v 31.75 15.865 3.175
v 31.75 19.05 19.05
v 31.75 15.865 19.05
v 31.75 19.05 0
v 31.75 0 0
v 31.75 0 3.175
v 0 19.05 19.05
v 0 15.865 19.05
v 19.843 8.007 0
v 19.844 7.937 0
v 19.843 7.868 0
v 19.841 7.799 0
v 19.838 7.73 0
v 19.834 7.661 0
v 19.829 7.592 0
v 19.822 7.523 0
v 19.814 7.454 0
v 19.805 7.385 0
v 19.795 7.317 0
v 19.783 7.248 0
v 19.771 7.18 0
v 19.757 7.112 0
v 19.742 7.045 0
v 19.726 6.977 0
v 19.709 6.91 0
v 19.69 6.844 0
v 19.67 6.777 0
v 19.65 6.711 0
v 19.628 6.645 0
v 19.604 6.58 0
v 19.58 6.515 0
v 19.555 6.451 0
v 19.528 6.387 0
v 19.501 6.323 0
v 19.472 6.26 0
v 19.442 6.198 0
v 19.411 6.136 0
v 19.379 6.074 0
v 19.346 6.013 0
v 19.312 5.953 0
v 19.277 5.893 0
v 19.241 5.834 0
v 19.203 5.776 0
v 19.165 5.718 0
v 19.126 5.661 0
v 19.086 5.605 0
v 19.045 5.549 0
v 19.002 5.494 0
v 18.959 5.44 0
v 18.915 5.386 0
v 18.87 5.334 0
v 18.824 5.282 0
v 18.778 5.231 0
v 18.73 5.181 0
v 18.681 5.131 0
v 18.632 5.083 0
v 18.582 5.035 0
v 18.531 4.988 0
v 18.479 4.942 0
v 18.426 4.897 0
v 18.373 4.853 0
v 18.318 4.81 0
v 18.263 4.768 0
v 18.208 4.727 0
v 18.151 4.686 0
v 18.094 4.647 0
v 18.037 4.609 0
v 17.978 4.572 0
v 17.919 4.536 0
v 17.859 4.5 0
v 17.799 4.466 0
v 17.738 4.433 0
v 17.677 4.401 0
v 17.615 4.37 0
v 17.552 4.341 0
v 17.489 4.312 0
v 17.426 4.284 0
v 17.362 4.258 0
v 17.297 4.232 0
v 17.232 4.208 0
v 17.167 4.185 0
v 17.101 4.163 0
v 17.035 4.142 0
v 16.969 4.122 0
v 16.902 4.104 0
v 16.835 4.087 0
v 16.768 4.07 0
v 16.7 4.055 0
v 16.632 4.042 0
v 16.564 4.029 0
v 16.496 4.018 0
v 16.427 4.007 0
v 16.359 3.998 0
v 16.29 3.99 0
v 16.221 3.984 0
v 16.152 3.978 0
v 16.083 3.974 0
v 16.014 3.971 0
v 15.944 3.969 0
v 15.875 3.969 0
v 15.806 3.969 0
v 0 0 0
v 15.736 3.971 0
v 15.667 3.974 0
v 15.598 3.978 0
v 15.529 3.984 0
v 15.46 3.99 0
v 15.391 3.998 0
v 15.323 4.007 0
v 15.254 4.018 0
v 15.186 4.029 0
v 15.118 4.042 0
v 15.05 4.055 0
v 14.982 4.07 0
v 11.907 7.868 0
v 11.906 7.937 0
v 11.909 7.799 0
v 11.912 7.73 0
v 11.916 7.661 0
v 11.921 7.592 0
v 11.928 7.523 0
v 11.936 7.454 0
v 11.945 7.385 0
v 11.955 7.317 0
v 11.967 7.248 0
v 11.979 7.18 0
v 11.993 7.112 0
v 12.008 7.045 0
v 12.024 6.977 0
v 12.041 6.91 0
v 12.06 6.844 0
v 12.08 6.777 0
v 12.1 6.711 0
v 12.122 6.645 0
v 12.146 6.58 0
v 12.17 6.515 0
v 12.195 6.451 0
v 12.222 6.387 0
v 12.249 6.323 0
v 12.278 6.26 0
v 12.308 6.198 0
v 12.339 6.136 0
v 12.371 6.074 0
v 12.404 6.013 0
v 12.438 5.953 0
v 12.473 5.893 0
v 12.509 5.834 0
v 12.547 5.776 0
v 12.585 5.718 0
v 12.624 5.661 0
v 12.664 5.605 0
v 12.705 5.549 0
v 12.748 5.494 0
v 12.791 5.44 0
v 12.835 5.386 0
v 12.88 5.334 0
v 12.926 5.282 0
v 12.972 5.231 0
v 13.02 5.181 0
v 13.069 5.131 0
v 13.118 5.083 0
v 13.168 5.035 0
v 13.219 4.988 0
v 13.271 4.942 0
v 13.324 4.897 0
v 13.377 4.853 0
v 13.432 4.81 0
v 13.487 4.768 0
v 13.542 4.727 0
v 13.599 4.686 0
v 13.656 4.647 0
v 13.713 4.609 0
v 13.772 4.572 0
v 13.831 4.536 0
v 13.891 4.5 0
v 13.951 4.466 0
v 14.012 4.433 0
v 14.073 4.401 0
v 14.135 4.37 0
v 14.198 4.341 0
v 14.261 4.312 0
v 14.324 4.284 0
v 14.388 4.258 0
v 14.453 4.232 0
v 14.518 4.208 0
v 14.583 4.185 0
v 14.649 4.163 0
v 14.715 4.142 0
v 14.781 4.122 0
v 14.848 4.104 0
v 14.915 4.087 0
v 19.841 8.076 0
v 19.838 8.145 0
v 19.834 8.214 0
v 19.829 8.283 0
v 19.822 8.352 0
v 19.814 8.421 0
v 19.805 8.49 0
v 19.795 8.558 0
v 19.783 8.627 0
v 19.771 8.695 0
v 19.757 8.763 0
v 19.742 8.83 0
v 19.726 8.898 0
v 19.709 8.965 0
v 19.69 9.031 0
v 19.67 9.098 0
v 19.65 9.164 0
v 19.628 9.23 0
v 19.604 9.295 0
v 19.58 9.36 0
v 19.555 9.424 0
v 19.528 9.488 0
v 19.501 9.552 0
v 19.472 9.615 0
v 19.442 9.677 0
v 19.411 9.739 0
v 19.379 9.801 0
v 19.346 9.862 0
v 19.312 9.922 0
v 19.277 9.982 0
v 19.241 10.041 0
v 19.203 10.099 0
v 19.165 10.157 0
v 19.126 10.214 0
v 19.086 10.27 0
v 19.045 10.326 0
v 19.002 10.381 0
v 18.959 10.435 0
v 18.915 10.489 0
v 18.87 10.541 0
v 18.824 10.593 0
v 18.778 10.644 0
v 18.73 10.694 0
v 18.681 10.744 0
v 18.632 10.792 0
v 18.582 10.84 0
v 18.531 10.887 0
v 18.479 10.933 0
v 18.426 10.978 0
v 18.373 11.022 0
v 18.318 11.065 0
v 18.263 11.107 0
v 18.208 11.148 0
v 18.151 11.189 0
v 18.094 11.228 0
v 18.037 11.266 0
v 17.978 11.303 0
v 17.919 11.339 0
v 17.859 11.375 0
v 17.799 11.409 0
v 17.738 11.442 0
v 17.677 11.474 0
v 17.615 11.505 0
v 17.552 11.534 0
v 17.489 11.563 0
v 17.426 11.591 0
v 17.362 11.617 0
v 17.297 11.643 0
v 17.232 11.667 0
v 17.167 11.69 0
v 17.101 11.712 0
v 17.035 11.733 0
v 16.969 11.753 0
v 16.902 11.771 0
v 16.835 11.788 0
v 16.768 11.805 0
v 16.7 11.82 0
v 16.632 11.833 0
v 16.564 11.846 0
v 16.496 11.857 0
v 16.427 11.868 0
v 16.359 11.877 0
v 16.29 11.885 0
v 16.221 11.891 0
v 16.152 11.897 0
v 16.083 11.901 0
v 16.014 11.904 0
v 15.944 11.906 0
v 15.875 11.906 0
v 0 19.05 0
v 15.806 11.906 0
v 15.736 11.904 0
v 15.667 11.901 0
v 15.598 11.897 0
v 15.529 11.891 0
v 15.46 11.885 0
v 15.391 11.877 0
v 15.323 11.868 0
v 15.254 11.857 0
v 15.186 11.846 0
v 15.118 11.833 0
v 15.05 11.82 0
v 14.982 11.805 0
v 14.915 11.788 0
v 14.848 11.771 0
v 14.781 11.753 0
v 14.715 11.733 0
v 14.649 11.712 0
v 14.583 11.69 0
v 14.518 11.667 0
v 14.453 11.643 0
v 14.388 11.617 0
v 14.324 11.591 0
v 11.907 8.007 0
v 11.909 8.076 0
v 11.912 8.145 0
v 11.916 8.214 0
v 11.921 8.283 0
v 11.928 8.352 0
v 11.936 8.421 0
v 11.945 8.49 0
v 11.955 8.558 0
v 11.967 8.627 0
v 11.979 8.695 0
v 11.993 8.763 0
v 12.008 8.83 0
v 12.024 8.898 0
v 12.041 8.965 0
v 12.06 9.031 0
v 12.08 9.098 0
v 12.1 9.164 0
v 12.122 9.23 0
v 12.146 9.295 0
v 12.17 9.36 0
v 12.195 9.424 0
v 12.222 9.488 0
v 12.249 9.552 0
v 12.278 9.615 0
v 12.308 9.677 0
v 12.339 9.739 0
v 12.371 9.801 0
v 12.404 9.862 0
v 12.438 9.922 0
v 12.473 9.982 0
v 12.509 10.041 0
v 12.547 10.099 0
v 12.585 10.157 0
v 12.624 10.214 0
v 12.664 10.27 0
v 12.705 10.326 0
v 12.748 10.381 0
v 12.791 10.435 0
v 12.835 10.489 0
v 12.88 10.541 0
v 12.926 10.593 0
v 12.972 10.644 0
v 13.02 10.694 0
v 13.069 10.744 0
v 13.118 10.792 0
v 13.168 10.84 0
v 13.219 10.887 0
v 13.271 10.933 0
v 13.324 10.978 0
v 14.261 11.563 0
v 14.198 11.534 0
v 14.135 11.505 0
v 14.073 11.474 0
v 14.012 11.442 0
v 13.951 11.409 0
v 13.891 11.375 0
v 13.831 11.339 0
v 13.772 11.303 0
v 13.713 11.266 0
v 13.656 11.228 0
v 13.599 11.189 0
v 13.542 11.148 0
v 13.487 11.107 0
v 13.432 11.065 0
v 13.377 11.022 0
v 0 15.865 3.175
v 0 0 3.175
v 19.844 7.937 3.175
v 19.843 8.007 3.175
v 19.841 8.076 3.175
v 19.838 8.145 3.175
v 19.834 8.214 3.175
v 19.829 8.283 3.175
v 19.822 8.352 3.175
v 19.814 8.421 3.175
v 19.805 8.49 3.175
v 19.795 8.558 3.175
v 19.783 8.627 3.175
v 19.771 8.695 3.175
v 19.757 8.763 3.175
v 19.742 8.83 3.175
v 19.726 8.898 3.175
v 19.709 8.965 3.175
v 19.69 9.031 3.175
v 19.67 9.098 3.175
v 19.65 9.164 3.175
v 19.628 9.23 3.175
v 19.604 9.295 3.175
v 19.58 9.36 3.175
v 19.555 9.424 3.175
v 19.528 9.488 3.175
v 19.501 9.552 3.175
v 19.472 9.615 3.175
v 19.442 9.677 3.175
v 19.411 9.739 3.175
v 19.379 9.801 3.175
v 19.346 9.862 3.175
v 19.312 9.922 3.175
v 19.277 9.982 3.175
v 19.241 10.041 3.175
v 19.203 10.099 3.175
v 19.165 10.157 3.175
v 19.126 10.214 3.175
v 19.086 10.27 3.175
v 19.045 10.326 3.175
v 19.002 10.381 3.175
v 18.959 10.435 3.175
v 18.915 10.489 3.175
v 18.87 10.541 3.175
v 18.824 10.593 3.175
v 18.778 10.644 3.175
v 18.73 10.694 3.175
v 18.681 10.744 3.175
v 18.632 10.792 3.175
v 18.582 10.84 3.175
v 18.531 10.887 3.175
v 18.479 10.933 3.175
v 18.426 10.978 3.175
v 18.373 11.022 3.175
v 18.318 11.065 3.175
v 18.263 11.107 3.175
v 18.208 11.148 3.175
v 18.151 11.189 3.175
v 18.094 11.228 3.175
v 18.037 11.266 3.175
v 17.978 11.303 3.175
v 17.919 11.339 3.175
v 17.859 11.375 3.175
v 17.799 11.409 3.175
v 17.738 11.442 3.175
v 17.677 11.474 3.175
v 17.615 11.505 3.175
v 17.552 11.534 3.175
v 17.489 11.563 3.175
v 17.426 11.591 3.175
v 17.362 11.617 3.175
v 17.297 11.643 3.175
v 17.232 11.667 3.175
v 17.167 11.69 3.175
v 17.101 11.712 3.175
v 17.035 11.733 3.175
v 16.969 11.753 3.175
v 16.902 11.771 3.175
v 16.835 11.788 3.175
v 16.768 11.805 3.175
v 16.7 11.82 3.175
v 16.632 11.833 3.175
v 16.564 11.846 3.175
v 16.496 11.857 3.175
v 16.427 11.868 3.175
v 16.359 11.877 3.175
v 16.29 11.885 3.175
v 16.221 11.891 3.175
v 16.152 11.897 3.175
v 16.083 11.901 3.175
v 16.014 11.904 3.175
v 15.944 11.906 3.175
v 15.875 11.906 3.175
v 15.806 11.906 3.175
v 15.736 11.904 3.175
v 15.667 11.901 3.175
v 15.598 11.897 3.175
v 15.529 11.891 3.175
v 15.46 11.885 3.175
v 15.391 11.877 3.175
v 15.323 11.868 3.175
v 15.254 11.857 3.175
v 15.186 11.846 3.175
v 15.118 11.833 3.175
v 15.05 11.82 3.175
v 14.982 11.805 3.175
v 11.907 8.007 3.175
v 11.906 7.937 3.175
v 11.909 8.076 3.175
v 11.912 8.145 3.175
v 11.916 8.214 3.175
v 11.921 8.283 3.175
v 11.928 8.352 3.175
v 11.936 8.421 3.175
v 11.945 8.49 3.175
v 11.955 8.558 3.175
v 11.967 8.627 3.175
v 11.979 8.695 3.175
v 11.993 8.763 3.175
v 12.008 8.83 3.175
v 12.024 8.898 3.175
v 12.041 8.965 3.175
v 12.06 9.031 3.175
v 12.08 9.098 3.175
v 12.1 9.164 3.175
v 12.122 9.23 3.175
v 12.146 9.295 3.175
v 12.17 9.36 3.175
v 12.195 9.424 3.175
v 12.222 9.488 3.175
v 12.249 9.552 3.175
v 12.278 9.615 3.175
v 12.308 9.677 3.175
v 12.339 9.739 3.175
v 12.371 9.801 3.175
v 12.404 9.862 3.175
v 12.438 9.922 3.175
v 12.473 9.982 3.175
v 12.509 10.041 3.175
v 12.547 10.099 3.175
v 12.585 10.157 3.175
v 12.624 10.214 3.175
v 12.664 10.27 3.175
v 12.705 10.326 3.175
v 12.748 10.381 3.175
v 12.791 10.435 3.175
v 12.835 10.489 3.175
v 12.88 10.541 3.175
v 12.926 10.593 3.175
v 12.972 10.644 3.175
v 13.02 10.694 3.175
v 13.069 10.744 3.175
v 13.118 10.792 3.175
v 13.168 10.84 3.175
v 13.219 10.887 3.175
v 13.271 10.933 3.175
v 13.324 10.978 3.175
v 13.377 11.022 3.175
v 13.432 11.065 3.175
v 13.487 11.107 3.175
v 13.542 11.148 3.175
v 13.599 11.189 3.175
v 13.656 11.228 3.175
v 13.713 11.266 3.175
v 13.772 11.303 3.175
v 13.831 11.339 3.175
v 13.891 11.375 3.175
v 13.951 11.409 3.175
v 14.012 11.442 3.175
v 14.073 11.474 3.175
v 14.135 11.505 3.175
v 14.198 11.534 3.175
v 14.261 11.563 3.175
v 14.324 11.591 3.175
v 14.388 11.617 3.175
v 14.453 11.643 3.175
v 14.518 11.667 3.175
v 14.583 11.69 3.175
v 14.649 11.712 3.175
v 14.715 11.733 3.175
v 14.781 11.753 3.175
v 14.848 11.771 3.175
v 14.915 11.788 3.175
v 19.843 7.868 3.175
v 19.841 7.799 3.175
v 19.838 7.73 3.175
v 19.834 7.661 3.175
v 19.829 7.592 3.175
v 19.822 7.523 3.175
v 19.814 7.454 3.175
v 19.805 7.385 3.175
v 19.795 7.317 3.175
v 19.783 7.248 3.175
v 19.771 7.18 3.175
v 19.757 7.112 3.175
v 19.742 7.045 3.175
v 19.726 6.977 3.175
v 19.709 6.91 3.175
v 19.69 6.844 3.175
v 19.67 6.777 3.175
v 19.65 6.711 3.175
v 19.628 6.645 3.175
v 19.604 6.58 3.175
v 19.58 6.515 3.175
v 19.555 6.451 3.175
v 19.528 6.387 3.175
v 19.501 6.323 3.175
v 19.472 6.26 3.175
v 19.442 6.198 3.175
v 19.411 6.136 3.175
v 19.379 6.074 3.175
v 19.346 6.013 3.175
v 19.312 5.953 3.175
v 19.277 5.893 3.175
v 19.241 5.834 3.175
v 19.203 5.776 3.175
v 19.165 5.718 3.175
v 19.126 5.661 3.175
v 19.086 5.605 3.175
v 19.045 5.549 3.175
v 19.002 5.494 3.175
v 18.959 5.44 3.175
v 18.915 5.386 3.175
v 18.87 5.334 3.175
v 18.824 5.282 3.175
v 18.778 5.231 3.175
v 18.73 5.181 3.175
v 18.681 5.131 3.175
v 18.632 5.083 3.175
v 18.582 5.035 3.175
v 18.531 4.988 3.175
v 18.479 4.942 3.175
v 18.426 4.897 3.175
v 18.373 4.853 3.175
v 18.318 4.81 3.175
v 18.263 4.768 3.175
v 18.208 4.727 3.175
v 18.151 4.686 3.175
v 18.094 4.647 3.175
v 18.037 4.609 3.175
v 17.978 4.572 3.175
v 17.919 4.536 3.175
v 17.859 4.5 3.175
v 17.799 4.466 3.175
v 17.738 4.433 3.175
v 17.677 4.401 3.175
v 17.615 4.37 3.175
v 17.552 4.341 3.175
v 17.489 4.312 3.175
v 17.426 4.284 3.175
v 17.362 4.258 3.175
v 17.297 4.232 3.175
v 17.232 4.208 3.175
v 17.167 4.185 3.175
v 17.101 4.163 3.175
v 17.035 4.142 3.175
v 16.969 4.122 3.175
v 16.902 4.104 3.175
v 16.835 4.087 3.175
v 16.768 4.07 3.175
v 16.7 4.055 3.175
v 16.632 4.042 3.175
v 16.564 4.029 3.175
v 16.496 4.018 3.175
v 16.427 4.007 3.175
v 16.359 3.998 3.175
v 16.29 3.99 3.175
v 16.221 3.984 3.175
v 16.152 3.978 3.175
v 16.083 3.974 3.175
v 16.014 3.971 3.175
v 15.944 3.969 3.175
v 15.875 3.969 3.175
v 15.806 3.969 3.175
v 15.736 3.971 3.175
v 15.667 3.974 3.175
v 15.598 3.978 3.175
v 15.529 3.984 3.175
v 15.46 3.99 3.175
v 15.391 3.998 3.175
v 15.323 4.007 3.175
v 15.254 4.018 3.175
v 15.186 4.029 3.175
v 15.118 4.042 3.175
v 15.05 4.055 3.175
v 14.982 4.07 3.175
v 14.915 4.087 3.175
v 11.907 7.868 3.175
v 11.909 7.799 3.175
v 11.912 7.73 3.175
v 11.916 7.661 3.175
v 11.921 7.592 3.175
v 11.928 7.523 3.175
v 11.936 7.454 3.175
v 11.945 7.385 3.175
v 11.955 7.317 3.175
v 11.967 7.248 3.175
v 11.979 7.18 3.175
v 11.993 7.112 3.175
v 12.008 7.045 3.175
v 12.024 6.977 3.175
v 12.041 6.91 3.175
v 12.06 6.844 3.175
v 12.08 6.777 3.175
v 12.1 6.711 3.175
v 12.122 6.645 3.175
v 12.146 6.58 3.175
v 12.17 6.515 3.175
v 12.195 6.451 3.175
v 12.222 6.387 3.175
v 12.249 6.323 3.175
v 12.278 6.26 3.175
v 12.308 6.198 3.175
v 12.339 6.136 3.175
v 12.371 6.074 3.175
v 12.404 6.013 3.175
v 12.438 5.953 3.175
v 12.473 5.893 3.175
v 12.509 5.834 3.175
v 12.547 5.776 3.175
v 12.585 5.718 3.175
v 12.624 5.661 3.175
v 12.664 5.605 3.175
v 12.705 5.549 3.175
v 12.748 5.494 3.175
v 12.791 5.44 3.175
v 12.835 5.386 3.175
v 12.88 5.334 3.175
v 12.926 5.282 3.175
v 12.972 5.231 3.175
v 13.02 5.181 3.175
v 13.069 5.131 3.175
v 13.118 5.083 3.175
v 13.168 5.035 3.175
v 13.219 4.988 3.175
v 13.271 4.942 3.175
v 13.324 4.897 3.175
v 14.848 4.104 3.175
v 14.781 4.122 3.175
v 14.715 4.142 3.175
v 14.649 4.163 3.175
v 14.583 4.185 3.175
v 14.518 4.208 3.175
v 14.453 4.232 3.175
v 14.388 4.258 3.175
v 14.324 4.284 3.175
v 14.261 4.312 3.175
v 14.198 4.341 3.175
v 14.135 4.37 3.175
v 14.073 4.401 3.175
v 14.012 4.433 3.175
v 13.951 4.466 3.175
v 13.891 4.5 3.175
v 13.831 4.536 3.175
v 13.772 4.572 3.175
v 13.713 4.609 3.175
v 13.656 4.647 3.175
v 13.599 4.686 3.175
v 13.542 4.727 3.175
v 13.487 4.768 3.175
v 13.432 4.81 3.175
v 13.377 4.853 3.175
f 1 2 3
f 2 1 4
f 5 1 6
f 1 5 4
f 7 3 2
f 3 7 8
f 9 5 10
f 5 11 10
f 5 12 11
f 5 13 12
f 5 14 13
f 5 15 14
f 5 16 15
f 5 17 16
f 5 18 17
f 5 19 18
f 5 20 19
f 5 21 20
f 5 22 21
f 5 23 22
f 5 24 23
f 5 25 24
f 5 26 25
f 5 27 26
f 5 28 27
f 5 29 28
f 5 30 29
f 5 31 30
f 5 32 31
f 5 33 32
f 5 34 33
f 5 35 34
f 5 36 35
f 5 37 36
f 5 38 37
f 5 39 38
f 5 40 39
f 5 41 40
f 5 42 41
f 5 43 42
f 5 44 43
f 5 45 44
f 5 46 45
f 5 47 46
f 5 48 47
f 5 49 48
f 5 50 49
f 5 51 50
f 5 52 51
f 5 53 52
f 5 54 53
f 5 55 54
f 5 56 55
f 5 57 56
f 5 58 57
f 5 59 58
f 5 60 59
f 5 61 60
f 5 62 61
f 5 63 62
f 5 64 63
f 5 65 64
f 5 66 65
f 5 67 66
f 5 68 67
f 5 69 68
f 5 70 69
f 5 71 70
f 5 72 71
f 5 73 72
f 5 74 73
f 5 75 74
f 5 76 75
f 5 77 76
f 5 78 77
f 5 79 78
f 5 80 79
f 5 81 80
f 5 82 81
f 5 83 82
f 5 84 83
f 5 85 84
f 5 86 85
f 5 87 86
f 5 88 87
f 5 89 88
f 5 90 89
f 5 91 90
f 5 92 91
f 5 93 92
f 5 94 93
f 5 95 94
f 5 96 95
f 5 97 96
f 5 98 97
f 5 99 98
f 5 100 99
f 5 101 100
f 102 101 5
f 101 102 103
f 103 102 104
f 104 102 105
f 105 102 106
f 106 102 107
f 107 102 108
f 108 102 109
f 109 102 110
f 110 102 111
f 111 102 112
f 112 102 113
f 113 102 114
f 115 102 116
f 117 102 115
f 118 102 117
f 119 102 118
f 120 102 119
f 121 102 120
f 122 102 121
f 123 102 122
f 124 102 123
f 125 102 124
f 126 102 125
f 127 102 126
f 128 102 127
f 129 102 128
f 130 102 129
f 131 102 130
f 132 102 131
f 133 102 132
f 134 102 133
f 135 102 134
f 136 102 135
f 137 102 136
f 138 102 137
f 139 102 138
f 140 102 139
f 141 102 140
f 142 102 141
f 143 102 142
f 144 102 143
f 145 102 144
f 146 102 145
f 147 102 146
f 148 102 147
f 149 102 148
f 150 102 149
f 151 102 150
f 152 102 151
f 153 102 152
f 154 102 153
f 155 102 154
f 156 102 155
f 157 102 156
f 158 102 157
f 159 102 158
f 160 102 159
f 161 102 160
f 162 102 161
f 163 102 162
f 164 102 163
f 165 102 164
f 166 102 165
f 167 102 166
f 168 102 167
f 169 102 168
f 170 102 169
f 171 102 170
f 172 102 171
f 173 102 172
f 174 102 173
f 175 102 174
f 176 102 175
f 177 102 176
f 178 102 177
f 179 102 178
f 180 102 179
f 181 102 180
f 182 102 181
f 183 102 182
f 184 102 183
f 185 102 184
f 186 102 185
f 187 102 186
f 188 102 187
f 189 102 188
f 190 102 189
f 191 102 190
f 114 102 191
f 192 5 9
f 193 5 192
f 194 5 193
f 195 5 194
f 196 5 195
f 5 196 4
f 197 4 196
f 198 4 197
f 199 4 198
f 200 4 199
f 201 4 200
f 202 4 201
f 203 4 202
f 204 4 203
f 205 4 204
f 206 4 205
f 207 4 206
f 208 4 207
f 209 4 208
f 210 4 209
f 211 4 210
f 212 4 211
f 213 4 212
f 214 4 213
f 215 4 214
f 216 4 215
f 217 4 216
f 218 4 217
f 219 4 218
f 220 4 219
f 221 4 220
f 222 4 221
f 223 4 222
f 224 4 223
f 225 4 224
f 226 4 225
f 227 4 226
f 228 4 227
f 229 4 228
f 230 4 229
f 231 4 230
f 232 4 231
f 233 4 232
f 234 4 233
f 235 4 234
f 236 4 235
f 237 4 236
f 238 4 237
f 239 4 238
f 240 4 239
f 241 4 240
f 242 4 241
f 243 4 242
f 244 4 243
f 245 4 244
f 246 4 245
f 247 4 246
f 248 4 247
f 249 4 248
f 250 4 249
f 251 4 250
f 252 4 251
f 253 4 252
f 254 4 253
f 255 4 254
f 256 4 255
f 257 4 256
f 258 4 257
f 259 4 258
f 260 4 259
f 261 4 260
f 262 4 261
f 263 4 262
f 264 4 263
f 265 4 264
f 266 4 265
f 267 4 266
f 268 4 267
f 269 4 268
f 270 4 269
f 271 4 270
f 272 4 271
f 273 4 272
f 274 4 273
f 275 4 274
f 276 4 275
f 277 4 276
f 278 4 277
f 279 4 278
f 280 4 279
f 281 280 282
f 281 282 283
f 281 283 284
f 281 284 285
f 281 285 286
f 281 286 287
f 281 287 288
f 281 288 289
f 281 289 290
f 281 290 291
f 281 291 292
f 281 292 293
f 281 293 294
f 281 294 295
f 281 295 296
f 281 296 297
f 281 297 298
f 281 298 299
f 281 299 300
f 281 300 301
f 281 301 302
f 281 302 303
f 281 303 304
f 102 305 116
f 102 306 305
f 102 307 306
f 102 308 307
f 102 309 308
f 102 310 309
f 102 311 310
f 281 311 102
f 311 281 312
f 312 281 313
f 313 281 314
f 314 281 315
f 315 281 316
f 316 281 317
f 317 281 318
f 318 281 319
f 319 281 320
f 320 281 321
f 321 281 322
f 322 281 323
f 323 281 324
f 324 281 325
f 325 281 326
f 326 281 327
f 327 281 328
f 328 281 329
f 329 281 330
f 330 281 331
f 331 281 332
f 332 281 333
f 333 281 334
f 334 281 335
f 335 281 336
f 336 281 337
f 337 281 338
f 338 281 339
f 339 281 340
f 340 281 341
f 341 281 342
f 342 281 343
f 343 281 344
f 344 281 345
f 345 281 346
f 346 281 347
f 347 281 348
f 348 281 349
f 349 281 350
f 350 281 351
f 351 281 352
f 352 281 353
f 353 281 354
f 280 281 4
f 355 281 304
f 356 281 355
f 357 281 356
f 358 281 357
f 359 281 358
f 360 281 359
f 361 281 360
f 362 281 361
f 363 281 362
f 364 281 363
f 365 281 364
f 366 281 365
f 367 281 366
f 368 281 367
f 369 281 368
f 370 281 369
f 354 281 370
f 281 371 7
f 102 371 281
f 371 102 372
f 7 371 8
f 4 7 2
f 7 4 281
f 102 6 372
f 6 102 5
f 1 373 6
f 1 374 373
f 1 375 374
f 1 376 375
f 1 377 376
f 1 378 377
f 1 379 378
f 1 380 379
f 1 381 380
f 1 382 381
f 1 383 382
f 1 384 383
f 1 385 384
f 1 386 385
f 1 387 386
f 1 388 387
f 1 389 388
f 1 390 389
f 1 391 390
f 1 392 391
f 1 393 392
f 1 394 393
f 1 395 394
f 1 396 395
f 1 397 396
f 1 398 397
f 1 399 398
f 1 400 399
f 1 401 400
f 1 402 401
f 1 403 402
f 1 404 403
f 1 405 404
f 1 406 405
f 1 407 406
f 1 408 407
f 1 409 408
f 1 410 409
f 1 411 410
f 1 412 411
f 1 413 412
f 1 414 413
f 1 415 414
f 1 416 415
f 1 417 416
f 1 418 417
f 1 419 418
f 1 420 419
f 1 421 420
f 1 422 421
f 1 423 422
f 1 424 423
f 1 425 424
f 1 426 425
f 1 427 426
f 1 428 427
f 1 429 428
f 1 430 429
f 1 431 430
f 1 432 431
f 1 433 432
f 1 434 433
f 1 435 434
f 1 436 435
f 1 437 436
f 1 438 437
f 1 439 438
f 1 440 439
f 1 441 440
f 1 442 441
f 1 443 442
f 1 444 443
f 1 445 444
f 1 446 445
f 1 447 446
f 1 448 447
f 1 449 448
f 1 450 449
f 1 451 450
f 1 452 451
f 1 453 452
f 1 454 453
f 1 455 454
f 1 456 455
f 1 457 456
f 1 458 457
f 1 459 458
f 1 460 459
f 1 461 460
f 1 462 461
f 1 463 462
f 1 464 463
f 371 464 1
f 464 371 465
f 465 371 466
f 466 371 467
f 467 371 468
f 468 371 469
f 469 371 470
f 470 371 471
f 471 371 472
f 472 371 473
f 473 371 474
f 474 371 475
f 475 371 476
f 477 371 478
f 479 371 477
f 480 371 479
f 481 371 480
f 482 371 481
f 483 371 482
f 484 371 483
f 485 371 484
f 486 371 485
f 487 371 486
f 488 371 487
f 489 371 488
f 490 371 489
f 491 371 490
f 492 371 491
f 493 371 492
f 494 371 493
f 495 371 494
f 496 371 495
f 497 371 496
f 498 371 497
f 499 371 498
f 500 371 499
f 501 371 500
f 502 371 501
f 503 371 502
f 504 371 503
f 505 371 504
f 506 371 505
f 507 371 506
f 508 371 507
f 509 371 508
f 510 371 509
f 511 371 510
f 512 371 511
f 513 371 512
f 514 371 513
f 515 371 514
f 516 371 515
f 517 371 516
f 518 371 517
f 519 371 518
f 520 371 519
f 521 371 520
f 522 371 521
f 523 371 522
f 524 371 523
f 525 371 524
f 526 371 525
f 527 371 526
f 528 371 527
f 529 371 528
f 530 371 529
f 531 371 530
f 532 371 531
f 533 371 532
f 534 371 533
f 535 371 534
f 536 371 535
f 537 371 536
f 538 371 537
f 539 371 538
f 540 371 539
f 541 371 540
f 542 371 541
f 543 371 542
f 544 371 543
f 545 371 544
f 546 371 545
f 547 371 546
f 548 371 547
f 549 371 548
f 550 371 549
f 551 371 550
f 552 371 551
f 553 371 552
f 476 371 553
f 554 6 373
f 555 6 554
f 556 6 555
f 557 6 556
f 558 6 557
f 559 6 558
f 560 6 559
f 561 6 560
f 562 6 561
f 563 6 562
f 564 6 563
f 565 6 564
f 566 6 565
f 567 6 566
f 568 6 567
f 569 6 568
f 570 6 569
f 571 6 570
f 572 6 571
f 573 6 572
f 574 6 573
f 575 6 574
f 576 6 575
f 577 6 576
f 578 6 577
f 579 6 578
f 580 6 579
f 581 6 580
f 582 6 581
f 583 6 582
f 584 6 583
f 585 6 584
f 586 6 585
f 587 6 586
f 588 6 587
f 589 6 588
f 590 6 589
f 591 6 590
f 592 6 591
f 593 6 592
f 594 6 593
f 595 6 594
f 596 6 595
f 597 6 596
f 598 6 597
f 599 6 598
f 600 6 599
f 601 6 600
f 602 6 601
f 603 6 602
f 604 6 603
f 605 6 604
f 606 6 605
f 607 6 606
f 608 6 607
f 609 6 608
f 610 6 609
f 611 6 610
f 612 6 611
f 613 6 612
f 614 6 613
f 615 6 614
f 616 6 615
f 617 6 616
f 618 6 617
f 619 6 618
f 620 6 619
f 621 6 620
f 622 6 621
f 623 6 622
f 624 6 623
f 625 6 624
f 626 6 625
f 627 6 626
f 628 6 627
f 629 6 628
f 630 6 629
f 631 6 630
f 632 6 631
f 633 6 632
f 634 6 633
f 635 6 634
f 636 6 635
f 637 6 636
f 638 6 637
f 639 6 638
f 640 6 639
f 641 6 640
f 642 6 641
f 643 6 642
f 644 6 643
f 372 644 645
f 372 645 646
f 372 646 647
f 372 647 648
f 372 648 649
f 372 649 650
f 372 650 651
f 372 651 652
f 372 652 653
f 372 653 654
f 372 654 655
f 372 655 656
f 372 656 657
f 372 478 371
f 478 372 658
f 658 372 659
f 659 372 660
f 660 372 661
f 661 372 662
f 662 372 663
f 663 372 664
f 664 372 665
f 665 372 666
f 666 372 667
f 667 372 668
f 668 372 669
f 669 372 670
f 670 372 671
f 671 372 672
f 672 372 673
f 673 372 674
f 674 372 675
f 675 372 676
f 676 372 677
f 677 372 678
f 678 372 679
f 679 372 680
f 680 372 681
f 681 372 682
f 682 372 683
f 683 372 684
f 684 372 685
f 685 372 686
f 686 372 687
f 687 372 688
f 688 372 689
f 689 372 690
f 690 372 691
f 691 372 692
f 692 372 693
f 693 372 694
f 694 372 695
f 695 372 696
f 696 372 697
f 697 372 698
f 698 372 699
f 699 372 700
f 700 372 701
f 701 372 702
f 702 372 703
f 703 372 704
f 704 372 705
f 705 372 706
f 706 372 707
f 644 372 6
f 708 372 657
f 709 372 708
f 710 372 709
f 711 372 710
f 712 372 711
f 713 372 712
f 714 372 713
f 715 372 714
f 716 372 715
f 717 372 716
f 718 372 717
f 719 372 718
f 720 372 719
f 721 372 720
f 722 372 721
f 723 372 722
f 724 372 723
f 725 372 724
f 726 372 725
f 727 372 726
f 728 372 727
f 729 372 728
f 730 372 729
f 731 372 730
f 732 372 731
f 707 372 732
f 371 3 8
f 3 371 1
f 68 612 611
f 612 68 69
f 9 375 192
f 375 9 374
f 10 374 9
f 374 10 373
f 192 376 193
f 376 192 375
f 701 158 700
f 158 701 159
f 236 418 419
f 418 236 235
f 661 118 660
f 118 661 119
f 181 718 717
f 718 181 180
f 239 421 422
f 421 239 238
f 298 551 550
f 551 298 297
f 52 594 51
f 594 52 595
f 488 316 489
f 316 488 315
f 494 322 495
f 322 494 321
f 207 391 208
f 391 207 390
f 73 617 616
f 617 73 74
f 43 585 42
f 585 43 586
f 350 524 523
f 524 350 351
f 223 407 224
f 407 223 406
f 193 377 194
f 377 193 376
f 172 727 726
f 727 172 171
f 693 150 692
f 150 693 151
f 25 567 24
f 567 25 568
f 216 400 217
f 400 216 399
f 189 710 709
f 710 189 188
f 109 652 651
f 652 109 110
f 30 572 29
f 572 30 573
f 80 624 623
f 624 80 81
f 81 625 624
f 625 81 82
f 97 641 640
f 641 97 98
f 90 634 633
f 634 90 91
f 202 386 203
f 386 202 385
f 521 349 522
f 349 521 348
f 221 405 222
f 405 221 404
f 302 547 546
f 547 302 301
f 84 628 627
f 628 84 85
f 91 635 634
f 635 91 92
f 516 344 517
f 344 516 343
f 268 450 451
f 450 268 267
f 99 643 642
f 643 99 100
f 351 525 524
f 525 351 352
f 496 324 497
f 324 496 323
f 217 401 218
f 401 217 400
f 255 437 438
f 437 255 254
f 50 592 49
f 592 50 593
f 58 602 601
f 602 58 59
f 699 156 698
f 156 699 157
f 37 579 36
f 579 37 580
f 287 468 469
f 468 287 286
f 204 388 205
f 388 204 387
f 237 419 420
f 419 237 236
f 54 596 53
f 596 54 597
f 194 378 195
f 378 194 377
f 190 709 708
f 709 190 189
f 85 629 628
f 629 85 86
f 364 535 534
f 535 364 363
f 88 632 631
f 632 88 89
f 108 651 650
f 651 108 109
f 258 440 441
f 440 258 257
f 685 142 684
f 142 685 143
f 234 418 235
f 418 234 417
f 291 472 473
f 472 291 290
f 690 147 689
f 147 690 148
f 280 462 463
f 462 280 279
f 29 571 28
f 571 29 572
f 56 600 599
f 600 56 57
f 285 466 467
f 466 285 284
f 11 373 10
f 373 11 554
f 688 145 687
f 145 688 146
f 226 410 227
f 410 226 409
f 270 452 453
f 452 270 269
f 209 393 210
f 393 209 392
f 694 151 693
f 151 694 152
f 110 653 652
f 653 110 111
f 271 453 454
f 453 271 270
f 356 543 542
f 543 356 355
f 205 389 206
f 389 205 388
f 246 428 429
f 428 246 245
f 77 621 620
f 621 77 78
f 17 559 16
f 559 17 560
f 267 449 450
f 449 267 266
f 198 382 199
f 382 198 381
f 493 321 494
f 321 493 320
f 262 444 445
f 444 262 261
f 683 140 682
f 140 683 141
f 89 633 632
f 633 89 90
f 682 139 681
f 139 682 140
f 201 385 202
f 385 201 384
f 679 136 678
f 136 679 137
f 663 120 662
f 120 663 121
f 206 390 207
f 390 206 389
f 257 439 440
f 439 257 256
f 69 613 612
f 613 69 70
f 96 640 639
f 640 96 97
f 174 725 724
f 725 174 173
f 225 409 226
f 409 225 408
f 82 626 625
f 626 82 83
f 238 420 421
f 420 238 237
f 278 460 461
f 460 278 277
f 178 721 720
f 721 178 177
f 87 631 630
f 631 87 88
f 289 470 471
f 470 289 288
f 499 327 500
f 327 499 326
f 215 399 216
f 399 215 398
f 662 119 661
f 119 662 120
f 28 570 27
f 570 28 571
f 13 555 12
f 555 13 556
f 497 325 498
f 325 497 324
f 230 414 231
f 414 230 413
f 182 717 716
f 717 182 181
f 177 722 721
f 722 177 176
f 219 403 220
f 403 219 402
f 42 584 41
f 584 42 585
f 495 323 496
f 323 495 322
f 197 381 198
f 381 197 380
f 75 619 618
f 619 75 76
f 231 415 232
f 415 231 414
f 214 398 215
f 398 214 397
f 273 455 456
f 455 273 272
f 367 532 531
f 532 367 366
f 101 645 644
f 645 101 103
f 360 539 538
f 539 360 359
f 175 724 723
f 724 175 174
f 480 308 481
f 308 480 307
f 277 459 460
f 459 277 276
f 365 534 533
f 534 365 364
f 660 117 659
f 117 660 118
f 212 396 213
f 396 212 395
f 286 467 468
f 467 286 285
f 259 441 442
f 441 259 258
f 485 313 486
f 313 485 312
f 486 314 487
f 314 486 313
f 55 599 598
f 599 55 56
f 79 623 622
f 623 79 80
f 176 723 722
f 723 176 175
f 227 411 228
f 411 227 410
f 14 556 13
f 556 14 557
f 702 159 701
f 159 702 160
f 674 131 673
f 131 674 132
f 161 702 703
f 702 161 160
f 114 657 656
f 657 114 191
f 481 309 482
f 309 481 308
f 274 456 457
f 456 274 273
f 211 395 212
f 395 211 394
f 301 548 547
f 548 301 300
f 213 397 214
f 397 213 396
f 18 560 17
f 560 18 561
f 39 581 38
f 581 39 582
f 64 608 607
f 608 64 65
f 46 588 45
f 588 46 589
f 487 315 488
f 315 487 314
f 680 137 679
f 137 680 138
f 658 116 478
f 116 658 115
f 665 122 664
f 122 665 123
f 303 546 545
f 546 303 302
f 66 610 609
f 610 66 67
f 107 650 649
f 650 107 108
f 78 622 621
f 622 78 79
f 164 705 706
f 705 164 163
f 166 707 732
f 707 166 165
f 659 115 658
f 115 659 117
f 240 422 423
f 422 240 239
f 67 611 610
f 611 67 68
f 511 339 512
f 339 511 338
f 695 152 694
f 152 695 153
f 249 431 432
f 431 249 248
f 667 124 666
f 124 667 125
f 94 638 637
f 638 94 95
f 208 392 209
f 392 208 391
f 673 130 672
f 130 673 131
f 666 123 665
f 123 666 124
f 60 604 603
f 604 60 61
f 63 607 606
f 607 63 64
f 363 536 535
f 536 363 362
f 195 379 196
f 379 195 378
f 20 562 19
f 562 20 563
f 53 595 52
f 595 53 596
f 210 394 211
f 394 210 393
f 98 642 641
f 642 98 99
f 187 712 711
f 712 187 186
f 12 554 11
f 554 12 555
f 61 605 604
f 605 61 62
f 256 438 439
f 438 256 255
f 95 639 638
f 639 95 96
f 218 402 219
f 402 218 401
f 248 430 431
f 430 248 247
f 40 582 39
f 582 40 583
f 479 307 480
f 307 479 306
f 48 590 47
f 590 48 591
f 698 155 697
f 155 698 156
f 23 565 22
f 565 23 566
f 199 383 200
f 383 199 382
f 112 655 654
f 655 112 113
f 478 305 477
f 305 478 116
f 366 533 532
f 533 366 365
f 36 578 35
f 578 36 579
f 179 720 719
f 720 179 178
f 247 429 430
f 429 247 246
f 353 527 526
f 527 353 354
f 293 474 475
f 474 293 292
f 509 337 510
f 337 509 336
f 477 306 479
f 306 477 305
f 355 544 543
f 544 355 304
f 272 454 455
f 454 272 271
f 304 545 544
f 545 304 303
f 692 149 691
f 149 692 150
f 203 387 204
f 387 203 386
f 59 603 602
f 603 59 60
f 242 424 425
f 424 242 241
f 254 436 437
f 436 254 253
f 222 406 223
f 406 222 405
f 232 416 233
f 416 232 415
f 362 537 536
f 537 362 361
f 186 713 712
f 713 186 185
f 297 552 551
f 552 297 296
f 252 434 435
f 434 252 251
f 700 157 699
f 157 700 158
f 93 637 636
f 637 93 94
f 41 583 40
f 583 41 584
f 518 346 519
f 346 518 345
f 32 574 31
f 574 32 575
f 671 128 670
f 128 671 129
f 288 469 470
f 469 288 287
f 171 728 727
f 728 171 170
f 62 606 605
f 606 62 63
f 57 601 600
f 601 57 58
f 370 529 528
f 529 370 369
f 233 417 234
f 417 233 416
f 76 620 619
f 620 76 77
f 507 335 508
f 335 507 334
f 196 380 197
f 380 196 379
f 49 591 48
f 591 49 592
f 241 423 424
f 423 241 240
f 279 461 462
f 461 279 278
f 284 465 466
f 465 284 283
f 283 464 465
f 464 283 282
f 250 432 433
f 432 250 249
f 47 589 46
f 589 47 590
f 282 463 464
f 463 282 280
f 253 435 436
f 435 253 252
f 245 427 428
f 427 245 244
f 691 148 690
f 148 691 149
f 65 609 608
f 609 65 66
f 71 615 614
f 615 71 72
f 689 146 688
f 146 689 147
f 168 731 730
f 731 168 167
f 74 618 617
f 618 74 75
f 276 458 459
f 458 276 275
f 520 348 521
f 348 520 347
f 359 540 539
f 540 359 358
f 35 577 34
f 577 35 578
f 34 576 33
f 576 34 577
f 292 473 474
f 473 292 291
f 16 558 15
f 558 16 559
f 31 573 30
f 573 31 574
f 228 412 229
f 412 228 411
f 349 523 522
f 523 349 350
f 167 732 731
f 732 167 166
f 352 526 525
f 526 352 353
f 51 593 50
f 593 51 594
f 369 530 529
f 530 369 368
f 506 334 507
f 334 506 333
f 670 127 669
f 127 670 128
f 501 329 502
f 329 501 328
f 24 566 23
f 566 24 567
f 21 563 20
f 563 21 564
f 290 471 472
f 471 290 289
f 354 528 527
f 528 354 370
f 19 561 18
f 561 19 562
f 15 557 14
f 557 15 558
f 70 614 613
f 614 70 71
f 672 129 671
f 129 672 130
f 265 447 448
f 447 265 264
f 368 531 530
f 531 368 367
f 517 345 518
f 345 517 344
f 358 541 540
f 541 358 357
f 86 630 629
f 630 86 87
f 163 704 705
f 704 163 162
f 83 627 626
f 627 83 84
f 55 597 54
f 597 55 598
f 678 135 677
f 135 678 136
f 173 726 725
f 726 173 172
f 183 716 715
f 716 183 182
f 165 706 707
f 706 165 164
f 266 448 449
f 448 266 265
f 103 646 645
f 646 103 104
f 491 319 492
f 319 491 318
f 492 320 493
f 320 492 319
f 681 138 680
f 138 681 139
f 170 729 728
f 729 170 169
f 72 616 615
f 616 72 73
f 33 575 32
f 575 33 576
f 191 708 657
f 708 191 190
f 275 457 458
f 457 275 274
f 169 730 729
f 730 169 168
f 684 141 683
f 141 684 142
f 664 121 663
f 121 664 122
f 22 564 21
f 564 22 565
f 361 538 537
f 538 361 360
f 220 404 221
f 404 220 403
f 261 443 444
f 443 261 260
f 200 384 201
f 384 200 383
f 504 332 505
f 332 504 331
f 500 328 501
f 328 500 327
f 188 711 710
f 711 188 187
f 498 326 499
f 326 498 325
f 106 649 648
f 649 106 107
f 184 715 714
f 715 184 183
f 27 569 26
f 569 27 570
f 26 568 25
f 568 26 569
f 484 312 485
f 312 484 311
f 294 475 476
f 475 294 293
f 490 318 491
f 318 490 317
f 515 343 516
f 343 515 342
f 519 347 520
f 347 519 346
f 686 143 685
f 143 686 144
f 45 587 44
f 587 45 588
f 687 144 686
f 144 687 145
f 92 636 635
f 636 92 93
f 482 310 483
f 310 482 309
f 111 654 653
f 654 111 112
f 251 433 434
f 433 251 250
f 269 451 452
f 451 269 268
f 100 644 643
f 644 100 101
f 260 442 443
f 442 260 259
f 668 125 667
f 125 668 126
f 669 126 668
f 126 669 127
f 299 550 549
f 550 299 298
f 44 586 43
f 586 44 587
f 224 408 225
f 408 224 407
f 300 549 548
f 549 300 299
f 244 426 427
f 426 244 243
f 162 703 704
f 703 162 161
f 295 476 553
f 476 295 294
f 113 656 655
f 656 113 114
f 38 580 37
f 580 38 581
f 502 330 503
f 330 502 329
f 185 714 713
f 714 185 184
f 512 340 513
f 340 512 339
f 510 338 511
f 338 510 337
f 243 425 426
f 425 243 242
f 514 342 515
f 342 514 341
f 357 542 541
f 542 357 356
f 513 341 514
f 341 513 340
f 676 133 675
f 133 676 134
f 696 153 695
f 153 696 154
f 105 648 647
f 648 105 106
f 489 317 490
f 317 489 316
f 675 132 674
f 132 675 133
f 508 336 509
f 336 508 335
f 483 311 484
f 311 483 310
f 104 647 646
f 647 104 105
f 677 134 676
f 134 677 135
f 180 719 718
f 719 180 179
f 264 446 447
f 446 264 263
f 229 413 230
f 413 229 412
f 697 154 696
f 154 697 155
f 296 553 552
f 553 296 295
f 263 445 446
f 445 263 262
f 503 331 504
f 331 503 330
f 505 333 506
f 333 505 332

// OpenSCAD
$fn = 360;

function in2mm (v) = v * 25.4;
function mm2in (v) = v / 25.4;
function frac (x, y) = (1 / y) * x;

cube_w = in2mm (1 + frac (1, 4));
cube_h = in2mm (0.75);
cube_d = in2mm (0.75);
cube_wall = in2mm (frac (1, 8));
hole_d = in2mm (frac (5, 16));

difference () {
  cube ([cube_w, cube_d, cube_h]);
  
  translate ([-0.01, -0.01, cube_wall])
    cube ([cube_w + 0.02, cube_d - cube_wall, (cube_h - cube_wall) + 0.02]);
  
  translate ([cube_w / 2, (cube_d - cube_wall) / 2, -0.01])
    cylinder (d = hole_d, h = cube_wall + 0.02);
}
